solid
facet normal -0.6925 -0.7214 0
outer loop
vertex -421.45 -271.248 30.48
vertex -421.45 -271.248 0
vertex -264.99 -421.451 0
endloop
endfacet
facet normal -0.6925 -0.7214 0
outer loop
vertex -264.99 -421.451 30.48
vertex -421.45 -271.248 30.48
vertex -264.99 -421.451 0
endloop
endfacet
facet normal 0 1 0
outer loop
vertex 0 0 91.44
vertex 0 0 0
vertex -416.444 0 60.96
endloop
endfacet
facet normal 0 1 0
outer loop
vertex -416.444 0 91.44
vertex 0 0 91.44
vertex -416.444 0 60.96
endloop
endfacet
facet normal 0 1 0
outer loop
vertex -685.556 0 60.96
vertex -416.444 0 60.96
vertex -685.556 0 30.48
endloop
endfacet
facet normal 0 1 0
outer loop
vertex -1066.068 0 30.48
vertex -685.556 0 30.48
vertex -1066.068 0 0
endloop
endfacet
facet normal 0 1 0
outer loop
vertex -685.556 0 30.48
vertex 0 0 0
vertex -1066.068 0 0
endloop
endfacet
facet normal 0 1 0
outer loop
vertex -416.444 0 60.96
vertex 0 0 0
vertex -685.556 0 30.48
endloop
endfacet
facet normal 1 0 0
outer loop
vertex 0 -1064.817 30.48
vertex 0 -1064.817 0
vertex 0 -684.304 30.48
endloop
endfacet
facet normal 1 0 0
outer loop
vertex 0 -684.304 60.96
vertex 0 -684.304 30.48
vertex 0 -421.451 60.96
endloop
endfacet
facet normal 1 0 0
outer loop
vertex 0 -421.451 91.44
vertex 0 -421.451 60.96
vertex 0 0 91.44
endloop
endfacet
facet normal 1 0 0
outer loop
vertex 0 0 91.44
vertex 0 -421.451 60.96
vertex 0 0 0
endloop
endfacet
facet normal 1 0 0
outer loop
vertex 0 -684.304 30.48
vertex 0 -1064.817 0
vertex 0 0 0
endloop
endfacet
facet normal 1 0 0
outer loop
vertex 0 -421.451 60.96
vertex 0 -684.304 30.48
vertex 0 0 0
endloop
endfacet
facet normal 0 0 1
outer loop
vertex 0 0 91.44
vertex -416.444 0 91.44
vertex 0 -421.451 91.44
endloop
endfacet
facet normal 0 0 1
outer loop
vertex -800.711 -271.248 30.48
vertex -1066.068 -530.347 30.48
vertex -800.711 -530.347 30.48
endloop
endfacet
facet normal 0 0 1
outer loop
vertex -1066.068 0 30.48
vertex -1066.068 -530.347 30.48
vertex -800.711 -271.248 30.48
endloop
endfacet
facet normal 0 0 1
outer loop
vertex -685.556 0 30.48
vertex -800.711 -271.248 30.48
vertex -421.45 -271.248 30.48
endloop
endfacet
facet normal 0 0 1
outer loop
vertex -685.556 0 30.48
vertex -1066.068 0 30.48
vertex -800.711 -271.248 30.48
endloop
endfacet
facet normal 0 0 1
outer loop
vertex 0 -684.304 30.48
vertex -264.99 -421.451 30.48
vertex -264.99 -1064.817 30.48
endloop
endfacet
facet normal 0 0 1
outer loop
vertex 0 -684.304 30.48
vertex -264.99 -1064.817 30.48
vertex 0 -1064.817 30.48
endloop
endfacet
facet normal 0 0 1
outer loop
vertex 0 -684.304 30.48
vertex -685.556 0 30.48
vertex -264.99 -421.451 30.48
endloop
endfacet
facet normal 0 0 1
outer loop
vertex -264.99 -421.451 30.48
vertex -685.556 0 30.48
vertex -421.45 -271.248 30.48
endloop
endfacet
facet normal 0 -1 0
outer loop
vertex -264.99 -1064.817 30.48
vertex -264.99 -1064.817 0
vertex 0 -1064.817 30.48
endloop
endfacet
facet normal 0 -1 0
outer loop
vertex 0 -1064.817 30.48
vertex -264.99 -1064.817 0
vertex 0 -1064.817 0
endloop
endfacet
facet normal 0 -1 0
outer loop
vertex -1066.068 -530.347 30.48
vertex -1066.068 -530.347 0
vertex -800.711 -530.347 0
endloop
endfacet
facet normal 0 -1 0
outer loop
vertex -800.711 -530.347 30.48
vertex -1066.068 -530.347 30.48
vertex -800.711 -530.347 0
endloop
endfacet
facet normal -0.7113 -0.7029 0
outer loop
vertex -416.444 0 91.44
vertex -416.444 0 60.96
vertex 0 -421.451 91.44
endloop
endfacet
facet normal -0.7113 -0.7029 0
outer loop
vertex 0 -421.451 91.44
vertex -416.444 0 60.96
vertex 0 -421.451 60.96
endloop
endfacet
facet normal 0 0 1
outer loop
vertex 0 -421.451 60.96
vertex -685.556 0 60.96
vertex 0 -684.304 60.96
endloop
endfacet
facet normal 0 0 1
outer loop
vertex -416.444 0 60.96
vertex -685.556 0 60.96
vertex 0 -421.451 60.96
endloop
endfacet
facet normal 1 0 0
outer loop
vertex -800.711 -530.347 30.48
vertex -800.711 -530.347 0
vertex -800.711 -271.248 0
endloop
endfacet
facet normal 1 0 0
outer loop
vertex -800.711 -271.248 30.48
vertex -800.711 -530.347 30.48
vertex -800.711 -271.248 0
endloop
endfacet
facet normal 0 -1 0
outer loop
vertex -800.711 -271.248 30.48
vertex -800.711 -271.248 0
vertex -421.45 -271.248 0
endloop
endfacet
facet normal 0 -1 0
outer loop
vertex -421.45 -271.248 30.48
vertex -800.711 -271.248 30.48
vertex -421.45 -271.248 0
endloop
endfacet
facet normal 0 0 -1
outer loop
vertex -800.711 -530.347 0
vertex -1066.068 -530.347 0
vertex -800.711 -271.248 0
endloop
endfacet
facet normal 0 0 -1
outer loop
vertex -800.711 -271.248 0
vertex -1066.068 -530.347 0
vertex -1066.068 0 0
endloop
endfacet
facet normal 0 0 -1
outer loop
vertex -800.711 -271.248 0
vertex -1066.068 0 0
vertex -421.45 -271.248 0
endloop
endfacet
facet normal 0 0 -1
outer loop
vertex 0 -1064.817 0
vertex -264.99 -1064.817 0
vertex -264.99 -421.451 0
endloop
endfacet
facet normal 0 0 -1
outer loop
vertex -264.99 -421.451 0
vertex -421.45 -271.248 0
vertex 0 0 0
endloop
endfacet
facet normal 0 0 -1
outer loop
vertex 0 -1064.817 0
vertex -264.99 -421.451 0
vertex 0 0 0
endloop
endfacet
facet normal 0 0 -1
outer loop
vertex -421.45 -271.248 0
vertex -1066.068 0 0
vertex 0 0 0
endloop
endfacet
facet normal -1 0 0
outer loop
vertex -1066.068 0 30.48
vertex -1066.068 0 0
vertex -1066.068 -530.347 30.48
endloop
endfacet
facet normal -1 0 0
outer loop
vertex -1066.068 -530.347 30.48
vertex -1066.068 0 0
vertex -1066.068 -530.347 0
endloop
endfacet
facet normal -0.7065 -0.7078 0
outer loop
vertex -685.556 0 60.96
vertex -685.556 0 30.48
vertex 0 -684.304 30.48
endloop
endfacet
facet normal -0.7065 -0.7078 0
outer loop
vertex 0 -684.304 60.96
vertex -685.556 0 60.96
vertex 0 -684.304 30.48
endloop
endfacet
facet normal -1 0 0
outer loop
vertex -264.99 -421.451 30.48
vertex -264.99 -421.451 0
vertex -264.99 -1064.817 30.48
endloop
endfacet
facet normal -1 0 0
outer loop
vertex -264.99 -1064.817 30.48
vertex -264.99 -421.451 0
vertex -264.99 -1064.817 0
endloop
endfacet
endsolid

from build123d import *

# Parameters (mm, degrees)
F1_DEPTH = 30.48
F3_DEPTH = 60.96
F5_DEPTH = 91.44


with BuildPart() as f1:
    # F0 (on Top) → F1 (new body)
    with BuildSketch(Plane.XY):
        Polygon((-1066.068411, 0), (-1066.068411, -530.347168), (-800.711095, -530.347168), (-800.711095, -271.248341), (-421.450496, -271.248341), (-264.989853, -421.450555), (-264.989853, -1064.816713), (0, -1064.816713), (0, 0), align=None)
    extrude(amount=F1_DEPTH)

    # F2 (on Top) → F3 (join)
    with BuildSketch(Plane.XY):
        Polygon((0, 0), (-685.556054, 0), (0, -684.304416), align=None)
    extrude(amount=F3_DEPTH)

    # F4 (on Top) → F5 (join)
    with BuildSketch(Plane.XY):
        Polygon((0, 0), (-416.443825, 0), (0, -421.450555), align=None)
    extrude(amount=F5_DEPTH)


solid = f1.part
